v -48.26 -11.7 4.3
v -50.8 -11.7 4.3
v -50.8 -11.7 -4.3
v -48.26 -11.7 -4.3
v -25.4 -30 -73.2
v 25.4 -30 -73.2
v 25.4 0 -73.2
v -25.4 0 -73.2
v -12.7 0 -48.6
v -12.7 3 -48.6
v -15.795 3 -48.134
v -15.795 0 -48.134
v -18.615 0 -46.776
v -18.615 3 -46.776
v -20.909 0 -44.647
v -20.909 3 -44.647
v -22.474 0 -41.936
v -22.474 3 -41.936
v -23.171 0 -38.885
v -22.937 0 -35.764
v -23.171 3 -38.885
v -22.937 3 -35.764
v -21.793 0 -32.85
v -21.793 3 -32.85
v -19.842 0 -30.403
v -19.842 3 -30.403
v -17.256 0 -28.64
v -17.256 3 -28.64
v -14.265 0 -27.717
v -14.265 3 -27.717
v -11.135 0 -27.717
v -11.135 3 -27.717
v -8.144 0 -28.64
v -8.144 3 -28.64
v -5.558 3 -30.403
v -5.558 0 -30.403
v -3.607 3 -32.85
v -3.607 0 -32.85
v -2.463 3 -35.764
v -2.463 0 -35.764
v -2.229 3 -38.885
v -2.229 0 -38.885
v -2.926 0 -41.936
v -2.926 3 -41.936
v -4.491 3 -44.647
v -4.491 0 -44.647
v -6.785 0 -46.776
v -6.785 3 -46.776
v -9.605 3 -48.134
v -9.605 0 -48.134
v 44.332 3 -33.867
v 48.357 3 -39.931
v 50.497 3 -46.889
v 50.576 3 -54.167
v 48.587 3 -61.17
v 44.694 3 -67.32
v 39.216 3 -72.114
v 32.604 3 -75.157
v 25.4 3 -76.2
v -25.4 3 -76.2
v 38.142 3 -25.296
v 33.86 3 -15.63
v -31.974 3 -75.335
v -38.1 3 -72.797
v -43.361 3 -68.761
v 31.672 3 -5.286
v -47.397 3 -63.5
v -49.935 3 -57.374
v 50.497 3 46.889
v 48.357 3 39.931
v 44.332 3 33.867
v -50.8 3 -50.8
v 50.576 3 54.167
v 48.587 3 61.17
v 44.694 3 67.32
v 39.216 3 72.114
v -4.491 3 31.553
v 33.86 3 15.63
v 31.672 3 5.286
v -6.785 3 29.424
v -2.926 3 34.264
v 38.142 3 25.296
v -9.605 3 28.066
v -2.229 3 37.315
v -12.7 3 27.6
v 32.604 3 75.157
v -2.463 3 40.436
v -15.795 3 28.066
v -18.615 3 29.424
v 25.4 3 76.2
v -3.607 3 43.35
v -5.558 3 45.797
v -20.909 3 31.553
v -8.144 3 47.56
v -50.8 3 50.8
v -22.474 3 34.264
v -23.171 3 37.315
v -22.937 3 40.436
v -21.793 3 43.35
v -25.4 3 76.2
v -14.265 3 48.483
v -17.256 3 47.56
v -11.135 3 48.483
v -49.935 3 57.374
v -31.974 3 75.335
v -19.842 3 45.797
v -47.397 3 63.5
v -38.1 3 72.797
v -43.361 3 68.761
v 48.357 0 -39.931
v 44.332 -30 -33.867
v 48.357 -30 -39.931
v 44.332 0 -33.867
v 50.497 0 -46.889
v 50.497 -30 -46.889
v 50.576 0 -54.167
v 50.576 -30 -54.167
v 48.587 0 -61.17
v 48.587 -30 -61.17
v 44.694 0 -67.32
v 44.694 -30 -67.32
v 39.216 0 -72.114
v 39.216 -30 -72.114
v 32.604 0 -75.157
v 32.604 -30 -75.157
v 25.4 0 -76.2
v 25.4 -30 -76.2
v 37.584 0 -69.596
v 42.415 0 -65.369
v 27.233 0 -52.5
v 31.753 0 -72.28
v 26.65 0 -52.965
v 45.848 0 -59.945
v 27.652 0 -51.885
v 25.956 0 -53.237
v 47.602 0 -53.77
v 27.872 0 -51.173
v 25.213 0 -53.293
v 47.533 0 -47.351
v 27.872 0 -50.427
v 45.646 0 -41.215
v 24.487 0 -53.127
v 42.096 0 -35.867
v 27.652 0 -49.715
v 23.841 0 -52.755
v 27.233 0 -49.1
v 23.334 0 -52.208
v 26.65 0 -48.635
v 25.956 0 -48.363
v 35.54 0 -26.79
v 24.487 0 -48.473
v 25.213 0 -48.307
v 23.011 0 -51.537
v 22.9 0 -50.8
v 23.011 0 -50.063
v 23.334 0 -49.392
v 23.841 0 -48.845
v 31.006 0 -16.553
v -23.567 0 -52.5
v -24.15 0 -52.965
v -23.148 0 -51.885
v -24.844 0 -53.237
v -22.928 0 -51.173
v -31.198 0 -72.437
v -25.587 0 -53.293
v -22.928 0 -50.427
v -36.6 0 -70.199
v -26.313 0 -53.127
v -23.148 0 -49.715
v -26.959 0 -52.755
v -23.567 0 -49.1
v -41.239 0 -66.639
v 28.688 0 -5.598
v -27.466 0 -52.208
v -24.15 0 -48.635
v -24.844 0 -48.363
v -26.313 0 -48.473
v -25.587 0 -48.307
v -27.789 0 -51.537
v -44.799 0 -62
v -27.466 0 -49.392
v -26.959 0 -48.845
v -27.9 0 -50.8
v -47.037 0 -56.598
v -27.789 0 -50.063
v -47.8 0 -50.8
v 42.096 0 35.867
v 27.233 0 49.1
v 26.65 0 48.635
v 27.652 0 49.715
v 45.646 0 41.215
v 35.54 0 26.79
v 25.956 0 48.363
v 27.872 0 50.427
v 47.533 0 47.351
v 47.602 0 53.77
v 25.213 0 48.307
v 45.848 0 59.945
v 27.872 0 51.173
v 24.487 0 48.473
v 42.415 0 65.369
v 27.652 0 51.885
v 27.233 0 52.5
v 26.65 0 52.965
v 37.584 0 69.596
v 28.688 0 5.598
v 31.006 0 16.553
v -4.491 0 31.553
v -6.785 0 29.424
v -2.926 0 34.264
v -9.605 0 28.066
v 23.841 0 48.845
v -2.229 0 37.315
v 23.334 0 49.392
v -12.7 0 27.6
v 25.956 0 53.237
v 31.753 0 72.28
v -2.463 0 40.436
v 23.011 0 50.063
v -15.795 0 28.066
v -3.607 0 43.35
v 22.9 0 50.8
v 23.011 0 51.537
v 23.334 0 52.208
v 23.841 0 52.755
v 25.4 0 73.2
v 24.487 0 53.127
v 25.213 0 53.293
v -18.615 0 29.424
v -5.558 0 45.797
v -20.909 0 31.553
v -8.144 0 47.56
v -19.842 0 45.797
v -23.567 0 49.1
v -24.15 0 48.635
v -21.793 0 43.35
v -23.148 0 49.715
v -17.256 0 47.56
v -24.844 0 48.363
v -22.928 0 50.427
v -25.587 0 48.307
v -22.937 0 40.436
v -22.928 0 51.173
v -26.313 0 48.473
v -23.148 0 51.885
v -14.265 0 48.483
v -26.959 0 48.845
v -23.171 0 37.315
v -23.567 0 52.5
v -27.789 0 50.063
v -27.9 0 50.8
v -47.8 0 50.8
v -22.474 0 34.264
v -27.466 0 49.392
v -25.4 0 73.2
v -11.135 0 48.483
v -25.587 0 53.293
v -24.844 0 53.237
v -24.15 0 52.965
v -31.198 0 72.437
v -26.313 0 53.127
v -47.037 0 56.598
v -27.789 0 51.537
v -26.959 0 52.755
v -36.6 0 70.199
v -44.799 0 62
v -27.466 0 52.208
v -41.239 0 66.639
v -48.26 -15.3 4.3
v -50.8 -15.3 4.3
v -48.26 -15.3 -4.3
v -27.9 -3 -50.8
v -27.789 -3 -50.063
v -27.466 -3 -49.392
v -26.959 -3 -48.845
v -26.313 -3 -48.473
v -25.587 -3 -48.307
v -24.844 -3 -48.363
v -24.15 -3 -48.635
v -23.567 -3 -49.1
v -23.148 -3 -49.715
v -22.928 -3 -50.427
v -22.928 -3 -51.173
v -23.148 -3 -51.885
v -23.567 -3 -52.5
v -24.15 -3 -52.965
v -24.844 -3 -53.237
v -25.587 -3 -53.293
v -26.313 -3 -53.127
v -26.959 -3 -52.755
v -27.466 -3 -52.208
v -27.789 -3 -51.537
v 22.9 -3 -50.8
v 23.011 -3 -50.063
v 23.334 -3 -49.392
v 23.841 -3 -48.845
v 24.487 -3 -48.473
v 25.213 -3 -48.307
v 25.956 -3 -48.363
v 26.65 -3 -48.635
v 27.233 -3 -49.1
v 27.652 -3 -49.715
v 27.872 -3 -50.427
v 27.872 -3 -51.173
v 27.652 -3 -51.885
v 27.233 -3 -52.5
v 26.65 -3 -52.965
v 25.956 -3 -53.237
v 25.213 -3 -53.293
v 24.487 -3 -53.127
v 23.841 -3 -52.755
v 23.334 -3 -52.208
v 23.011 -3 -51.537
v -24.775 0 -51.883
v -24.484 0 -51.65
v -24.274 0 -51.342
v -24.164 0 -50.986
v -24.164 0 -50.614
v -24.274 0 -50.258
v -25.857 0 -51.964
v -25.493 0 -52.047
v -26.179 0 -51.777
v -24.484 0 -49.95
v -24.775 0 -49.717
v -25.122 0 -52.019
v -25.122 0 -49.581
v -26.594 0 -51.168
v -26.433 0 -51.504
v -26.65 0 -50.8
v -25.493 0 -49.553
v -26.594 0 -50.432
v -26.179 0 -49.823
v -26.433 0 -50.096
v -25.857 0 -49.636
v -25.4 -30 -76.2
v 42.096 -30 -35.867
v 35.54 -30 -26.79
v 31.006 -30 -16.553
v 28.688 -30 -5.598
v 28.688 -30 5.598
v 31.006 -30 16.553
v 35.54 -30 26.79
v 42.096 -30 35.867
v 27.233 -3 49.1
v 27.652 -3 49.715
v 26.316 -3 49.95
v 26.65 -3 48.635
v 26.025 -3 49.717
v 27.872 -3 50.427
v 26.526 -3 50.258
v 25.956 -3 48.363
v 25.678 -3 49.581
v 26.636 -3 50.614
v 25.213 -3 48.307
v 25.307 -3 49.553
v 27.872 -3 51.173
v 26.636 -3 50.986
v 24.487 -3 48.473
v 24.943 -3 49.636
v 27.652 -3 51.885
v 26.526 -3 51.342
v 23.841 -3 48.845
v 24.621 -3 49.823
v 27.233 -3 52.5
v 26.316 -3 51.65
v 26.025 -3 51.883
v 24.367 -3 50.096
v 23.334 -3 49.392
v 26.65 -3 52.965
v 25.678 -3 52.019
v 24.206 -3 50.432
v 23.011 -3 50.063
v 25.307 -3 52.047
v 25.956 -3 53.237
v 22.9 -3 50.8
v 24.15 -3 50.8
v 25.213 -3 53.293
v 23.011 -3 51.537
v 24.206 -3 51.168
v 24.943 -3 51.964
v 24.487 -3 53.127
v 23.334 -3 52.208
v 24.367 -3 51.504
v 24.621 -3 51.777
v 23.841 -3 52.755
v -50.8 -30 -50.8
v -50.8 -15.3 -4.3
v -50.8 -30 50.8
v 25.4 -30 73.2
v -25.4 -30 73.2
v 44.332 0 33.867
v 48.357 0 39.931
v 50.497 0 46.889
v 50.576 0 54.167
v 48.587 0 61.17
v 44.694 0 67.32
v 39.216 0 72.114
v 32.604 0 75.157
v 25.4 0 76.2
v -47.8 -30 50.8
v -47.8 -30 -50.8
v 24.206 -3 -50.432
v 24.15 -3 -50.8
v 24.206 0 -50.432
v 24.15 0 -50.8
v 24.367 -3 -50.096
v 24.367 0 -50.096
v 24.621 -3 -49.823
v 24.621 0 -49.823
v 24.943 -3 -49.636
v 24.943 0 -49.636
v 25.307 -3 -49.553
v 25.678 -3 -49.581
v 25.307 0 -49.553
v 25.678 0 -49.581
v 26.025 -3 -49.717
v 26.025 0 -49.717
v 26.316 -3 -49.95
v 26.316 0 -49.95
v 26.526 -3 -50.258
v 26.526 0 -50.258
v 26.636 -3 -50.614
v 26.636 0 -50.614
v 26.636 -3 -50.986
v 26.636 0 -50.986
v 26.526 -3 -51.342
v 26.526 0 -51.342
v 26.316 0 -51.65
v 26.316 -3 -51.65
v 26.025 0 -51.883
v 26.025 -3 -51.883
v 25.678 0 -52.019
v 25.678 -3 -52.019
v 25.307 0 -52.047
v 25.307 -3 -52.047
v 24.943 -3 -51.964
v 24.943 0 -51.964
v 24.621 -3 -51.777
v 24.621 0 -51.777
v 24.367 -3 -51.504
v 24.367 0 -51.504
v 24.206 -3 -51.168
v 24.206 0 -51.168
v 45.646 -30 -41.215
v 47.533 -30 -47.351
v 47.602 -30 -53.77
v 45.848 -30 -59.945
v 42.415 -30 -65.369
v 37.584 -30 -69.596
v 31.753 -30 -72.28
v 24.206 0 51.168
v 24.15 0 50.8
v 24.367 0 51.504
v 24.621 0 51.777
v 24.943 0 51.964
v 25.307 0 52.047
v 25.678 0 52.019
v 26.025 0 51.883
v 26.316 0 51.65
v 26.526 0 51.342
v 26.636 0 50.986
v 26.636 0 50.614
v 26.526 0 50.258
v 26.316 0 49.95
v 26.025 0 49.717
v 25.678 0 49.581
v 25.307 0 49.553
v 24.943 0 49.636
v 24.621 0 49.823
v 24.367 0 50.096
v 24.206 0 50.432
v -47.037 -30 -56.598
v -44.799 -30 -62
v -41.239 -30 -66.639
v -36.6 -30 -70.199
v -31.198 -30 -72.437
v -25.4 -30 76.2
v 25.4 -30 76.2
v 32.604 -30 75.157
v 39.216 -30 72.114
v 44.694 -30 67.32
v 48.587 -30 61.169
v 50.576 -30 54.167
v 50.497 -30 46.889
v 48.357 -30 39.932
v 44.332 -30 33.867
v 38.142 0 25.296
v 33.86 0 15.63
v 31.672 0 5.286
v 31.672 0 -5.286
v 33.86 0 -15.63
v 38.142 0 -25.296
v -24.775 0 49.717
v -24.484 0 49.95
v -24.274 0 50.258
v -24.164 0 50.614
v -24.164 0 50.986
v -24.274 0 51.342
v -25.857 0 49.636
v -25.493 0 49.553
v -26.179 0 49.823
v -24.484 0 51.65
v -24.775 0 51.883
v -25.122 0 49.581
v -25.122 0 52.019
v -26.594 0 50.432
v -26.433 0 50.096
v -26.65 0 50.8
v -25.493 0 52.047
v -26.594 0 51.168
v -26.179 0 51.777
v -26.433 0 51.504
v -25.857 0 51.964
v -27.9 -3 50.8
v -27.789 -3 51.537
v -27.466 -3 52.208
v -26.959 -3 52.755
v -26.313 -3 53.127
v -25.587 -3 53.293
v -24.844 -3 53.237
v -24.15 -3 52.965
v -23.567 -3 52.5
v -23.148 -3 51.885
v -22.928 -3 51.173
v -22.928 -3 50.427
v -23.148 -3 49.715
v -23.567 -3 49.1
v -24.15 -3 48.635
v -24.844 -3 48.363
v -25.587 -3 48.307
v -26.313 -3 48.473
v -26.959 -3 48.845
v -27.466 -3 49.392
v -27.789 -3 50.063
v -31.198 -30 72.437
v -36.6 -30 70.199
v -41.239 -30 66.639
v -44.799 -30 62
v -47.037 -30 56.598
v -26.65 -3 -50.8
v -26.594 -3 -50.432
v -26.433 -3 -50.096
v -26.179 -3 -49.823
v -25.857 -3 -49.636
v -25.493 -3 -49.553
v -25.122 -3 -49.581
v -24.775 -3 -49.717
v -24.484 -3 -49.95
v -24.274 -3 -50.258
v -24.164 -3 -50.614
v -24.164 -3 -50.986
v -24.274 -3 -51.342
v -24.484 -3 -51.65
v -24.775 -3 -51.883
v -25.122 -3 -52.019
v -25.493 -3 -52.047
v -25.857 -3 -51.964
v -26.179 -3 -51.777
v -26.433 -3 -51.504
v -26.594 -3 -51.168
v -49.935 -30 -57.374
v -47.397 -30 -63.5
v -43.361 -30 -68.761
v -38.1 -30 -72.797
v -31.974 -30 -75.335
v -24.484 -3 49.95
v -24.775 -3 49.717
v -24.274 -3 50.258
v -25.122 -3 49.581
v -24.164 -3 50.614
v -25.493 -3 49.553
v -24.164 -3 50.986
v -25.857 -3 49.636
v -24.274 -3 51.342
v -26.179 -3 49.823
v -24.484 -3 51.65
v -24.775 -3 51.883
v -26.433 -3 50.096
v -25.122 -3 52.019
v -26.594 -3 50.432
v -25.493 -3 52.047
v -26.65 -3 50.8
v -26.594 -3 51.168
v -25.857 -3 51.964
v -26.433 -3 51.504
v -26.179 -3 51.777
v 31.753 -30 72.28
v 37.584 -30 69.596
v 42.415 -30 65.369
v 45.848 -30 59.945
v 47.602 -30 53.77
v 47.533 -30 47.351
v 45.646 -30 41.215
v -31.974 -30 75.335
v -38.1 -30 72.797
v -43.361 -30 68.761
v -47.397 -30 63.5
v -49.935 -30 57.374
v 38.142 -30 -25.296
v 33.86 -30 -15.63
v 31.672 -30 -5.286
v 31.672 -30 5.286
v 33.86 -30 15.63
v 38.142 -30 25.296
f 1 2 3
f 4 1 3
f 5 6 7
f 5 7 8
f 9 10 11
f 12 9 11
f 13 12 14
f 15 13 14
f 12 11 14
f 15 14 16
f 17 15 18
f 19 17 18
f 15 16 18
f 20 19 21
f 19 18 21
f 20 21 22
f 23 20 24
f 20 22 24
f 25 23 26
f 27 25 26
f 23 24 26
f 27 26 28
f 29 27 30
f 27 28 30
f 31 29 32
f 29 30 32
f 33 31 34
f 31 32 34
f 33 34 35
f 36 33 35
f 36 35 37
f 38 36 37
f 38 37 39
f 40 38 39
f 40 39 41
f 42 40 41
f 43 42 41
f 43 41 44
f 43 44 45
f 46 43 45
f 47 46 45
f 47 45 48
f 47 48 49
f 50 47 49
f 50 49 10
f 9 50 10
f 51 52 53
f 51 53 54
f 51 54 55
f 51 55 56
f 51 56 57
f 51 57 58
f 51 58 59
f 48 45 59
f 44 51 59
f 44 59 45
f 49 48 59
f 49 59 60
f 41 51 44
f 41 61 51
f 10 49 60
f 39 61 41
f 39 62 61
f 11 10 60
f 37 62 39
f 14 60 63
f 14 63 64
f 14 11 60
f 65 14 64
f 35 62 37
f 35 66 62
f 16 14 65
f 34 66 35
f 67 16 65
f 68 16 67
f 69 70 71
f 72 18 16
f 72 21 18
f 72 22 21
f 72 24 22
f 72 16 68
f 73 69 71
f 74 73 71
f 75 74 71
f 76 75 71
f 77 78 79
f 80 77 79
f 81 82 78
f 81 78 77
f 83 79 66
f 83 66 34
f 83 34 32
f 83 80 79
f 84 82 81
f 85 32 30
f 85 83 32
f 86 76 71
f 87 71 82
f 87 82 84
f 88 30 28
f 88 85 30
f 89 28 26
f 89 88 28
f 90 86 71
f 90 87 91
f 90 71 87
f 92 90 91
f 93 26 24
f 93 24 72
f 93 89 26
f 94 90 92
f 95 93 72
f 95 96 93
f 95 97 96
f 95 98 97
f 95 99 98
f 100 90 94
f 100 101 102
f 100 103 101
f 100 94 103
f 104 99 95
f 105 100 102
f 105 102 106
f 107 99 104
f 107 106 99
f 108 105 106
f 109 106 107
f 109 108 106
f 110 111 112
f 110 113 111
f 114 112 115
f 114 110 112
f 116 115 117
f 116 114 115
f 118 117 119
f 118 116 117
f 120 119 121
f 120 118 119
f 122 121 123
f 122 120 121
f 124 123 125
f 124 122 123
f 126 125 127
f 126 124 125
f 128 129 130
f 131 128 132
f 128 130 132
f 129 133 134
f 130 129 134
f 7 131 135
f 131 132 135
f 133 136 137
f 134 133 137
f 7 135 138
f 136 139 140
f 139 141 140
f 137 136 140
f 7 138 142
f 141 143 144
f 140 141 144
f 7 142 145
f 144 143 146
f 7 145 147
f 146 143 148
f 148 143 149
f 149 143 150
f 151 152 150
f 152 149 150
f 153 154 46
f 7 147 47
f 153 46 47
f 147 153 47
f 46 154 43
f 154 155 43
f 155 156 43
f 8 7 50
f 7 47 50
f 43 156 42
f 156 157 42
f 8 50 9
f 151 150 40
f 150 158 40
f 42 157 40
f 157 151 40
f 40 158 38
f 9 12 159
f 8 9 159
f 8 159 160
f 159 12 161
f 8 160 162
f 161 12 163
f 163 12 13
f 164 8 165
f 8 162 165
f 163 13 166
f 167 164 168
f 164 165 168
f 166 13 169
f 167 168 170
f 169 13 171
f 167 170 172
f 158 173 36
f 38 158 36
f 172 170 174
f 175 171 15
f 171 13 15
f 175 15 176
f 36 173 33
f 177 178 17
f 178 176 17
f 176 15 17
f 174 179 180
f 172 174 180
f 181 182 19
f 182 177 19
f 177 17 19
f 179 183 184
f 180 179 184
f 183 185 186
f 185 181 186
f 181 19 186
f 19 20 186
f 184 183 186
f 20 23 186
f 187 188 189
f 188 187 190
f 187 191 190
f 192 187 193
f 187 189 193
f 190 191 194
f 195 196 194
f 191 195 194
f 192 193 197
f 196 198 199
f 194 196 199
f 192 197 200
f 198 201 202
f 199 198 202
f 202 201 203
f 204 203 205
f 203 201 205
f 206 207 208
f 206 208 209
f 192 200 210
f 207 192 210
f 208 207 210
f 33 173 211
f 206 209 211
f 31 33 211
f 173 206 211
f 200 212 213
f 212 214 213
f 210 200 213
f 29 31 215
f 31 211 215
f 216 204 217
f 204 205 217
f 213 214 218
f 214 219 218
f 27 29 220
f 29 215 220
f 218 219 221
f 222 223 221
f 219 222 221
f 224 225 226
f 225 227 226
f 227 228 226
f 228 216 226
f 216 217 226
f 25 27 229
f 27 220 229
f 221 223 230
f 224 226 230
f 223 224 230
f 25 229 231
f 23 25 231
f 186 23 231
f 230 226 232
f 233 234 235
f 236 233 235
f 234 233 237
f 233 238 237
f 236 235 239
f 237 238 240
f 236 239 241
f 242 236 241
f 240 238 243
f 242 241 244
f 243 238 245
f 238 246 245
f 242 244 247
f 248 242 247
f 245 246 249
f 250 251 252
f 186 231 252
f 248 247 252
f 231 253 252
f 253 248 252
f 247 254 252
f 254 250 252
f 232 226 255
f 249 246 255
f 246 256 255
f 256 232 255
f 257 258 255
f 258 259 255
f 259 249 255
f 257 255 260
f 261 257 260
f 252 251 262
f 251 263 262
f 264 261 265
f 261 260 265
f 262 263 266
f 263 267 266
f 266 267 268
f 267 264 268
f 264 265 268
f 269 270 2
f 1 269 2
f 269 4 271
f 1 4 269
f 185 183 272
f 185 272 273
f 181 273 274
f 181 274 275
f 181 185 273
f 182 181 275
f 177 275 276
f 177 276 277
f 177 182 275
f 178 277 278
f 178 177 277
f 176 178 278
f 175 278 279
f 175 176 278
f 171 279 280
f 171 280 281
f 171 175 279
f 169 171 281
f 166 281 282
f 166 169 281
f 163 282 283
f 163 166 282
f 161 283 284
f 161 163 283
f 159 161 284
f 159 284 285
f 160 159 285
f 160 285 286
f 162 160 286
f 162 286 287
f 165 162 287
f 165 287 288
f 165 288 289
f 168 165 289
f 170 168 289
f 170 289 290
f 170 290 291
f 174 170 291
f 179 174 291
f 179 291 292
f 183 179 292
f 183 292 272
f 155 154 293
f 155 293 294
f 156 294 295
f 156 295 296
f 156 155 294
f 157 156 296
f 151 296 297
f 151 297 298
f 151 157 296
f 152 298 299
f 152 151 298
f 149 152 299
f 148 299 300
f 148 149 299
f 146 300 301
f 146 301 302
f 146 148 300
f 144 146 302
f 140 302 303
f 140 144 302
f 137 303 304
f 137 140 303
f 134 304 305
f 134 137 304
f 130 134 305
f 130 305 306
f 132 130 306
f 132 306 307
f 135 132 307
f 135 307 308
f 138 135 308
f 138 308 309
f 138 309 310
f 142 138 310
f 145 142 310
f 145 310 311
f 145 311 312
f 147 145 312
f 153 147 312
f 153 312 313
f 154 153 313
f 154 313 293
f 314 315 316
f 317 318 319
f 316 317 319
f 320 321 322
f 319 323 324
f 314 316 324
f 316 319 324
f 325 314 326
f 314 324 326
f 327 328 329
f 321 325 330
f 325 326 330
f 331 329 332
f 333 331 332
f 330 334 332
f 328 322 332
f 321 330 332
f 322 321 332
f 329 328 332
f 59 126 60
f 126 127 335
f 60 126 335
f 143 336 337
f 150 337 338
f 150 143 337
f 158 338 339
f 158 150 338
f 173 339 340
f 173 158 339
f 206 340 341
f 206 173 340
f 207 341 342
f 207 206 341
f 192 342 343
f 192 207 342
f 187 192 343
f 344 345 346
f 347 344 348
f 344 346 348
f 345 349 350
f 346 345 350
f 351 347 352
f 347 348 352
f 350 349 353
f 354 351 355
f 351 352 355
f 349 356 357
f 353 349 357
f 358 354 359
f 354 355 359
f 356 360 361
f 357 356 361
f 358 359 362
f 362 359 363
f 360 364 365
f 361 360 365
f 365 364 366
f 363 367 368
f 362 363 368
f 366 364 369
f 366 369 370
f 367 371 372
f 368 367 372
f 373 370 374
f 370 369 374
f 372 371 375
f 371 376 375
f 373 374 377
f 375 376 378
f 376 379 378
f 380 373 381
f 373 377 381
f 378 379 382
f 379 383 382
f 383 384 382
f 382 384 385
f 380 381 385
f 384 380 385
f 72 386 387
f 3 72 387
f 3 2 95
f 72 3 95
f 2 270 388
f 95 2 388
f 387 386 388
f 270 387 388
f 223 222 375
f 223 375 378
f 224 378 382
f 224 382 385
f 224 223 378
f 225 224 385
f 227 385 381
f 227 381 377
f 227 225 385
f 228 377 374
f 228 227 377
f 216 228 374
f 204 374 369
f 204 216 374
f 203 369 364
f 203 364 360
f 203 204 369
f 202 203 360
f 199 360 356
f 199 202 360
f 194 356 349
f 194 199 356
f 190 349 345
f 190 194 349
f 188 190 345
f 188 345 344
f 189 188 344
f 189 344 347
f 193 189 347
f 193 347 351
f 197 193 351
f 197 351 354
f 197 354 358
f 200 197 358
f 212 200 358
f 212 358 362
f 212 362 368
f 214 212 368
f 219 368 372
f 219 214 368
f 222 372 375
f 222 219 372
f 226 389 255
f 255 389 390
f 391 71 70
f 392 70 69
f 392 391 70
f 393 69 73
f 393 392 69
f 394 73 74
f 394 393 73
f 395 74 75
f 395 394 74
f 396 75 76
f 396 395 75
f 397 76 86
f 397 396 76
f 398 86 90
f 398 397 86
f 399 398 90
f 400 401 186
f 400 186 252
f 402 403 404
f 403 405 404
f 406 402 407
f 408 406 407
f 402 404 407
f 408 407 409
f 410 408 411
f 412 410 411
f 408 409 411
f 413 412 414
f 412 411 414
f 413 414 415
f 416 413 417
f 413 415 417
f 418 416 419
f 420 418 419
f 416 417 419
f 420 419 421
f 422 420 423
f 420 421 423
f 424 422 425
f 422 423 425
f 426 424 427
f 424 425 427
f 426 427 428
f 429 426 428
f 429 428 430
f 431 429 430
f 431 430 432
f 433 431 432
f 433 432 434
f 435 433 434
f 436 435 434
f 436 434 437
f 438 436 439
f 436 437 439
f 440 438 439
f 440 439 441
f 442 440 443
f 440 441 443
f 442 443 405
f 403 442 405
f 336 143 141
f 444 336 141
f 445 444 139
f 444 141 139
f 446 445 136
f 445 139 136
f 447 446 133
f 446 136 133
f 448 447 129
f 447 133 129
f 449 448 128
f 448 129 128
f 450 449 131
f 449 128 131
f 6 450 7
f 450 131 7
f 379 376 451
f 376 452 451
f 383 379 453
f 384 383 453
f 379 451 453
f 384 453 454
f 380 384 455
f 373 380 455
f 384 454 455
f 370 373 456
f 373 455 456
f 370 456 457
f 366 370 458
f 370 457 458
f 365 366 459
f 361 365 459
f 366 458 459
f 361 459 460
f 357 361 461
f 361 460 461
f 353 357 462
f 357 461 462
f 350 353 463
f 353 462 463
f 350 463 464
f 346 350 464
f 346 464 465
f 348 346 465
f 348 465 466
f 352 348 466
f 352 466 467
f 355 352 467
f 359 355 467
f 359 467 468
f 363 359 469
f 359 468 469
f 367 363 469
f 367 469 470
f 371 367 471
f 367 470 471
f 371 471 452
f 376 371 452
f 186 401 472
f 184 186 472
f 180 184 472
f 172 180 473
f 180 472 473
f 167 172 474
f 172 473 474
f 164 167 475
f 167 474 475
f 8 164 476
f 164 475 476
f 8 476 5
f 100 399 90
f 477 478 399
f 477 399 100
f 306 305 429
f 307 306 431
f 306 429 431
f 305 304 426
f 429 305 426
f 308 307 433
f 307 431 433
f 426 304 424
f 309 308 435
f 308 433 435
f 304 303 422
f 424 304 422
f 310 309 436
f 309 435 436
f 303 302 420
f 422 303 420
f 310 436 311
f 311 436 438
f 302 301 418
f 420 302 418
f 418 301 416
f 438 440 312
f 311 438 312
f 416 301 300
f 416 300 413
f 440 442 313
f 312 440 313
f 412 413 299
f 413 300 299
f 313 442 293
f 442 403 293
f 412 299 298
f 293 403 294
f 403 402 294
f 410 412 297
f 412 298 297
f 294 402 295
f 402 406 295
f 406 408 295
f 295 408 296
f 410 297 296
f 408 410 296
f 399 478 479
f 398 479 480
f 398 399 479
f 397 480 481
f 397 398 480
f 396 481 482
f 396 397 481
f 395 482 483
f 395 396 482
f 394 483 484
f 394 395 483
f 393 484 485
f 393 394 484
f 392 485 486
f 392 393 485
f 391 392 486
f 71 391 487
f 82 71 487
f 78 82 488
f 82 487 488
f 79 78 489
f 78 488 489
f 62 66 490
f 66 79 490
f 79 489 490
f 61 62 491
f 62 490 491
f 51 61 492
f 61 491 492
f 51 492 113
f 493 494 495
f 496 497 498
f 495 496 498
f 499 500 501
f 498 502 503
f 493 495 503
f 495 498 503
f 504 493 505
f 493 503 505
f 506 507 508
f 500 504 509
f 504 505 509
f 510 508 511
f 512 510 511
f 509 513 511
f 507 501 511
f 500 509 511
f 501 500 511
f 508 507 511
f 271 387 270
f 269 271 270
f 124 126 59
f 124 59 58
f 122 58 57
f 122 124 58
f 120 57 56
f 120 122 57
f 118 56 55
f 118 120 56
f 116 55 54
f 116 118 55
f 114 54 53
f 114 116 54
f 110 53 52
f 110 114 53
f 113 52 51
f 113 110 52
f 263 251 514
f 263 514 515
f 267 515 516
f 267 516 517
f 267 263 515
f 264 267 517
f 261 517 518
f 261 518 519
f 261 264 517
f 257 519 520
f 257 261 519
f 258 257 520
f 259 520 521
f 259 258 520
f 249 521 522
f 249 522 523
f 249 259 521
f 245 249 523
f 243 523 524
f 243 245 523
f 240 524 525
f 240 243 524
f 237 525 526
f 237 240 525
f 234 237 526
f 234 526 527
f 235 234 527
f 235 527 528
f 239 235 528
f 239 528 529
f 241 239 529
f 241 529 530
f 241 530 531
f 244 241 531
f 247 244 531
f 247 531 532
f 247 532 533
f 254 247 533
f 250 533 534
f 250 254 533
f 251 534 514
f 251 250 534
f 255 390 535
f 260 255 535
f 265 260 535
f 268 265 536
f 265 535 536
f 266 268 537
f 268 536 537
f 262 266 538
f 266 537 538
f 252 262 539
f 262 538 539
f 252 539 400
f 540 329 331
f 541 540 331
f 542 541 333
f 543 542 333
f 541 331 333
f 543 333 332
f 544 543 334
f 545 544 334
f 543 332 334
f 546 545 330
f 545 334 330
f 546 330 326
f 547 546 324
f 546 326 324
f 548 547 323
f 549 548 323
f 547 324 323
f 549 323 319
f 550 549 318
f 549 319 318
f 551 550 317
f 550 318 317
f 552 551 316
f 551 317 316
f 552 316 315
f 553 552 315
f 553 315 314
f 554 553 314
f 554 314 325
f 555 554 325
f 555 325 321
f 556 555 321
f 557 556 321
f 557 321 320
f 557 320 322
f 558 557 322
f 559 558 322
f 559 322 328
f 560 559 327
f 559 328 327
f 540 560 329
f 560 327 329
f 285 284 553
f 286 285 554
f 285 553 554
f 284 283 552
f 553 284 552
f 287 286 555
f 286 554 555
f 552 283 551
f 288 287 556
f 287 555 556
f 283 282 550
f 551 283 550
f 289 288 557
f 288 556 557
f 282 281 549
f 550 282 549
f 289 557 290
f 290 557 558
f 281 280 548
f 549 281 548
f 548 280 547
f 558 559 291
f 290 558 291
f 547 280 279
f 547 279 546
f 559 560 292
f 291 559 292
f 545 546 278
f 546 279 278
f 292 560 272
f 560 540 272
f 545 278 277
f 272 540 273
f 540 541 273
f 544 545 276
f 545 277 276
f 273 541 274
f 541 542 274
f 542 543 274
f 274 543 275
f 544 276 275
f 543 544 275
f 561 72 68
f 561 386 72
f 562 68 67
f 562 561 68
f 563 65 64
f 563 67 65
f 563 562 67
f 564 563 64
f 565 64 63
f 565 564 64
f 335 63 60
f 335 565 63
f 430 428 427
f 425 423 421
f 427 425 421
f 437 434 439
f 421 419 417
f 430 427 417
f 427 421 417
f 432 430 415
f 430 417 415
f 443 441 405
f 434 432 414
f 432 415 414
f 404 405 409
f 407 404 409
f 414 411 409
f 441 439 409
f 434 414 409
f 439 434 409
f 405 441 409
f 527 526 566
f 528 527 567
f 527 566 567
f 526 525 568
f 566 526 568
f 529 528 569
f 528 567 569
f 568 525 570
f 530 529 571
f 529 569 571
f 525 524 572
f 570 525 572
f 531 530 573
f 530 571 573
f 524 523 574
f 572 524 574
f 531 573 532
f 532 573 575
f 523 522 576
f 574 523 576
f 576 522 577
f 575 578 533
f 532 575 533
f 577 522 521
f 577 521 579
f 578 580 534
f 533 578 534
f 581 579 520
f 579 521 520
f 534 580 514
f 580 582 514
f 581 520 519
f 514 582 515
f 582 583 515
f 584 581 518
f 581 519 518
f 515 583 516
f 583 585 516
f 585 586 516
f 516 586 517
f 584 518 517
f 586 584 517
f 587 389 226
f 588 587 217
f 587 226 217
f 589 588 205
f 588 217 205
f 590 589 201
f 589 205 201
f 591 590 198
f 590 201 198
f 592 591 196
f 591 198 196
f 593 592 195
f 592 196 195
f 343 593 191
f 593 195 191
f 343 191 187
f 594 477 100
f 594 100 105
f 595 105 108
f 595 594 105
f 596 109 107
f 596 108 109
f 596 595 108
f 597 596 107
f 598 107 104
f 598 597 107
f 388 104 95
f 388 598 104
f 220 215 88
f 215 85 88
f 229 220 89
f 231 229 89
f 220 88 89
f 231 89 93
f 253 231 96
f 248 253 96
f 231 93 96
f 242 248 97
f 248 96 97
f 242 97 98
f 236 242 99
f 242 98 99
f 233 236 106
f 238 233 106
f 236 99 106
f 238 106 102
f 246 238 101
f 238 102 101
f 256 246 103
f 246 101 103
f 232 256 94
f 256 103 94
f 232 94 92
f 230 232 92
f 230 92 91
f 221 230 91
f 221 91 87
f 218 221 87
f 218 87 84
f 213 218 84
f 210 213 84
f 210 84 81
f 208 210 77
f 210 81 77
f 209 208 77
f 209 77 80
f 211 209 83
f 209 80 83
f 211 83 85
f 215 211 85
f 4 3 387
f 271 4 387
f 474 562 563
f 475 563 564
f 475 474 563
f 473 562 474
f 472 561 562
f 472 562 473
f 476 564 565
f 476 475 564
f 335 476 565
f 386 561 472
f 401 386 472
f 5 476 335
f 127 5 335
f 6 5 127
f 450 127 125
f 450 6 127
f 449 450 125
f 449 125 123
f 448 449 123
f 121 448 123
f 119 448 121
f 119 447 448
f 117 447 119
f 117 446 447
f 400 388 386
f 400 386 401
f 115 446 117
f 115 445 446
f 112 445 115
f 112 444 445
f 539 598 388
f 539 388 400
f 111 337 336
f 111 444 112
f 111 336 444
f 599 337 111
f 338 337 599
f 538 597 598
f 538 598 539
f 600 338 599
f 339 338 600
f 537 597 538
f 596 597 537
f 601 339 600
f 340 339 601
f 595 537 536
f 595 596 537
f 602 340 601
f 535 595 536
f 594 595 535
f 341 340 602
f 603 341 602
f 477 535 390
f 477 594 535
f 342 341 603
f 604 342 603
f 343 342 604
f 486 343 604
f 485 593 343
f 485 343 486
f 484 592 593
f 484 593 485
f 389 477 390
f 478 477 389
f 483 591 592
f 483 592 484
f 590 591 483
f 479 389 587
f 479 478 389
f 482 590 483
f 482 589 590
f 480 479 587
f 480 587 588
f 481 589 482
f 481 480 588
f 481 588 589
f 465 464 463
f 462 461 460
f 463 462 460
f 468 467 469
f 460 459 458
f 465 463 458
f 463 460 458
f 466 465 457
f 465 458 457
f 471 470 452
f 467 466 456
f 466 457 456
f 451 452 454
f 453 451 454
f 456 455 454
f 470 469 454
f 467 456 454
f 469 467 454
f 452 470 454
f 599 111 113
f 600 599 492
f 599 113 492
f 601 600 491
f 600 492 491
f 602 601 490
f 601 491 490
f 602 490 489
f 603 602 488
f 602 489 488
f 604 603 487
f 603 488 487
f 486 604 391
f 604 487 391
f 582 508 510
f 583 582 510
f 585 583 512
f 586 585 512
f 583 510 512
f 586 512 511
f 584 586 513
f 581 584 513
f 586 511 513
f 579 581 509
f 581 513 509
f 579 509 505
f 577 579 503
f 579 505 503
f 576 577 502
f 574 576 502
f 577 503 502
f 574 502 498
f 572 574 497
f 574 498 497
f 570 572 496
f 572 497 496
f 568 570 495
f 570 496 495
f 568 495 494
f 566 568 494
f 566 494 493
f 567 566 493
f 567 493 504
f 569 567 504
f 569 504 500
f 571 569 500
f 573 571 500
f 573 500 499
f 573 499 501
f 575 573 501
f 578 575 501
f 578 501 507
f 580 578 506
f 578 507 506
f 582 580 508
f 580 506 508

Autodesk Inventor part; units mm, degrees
ref_plane "YZ Plane" through (0, 0, 0) normal (1, 0, 0) x (0, 1, 0)
ref_plane "XZ Plane" through (0, 0, 0) normal (0, 1, 0) x (-1, 0, 0)
ref_plane "XY Plane" through (0, 0, 0) normal (0, 0, 1) x (1, 0, 0)
sketch "Sketch1" plane through (0, 0, 0) normal (0, 1, 0) x (-1, 0, 0)
  line L0 (-25.4, 76.2) -> (25.4, 76.2)
  line L1 (50.8, 76.2) -> (-50.8, 76.2)
  line L2 (-50.8, 50.8) -> (-50.8, -50.8)
  line L3 (50.8, 76.2) -> (-50.8, 76.2)
  line L4 (-25.4, -76.2) -> (25.4, -76.2)
  line L5 (50.8, -50.8) -> (50.8, 50.8)
  arc A0 (50.8, 50.8) -> (25.4, 76.2) centre (25.4, 50.8) ccw
  arc A1 (25.4, -76.2) -> (50.8, -50.8) centre (25.4, -50.8) ccw
  arc A2 (-50.8, -50.8) -> (-25.4, -76.2) centre (-25.4, -50.8) ccw
  arc A3 (-25.4, 76.2) -> (-50.8, 50.8) centre (-25.4, 50.8) ccw
  circle A4 centre (-25.4, 50.8) radius 25.4
  circle A5 centre (-25.4, -50.8) radius 25.4
  circle A6 centre (-50.8, 0) radius 31.3961
  circle A7 centre (-82.1961, 0) radius 50.8
  circle A8 centre (25.4, -50.8) radius 2.5
  circle A9 centre (25.4, -50.8) radius 1.25
  circle A10 centre (25.4, 50.8) radius 2.5
  circle A11 centre (25.4, 50.8) radius 1.25
  circle A12 centre (-25.4, 50.8) radius 2.5
  circle A13 centre (-25.4, 50.8) radius 1.25
  circle A14 centre (-25.4, -50.8) radius 2.5
  circle A15 centre (-25.4, -50.8) radius 1.25
  line L6 (-31.3961, 0) -> (50.8, 0)
  point P0 (-36.7592, 28.0815)
  point P1 (-36.7592, -28.0815)
  point P2 (12.7, 38.1)
  point P3 (12.7, -38.1)
  point P4 (-50.8, -31.3961)
  point P5 (-50.8, 31.3961)
  point P6 (-44.332, -33.8667)
  point P7 (-44.332, 33.8667)
  point P8 (9.7019, 0)
  point P9 (0.3879, -59.1619)
  point P10 (-13.7063, -28.2519)
  dimension "d6" = 101.6
  dimension "d21" = 25.4
  dimension "d68" = 2.5
  dimension "d69" = 2.5
  dimension "d70" = 2.5
  dimension "d71" = 2.5
  dimension "d72" = 5
  dimension "d73" = 5
  dimension "d74" = 5
  dimension "d75" = 5
extrude "Extrusion4" add sketch "Sketch1" along normal blind 3 contours A4 A3 | L0 A0 L5 L6 A6 A4 | A4 A6 A7 | A6 L6 A7 | L5 A1 L4 A5 A6 L6 | A6 A7 L6 | A5 A2 | A7 A6 A5 | A8 | A9 | A10 | A11 | A12 | A13 | A14 | A15
hole "Hole3" at (-12.7, 0, 38.1) at (-12.7, 0, -38.1) direction (0, 1, 0) diameter 21 depth 25.4 tip angle 118
sketch "Sketch5" plane through (0, 0, 0) normal (0, -1, 0) x (1, 0, 0)
  arc A0 (36.7592, 28.0815) -> (36.7592, -28.0815) centre (50.8, 0) ccw projected
  arc A1 (36.7592, 28.0815) -> (36.7592, -28.0815) centre (50.8, 0) ccw
  arc A2 (44.332, 33.8667) -> (25.4, 76.2) centre (25.4, 50.8) ccw projected
  arc A3 (36.7592, 28.0815) -> (25.4, 76.2) centre (25.4, 50.8) ccw
  arc A4 (25.4, -76.2) -> (44.332, -33.8667) centre (25.4, -50.8) ccw projected
  arc A5 (25.4, -76.2) -> (36.7592, -28.0815) centre (25.4, -50.8) ccw
  arc A6 (-25.4, 76.2) -> (-50.8, 50.8) centre (-25.4, 50.8) ccw projected
  line L0 (-50.8, -50.8) -> (-50.8, 50.8) projected
  arc A7 (-25.4, 76.2) -> (-50.8, 50.8) centre (-25.4, 50.8) ccw
  arc A8 (-50.8, -50.8) -> (-25.4, -76.2) centre (-25.4, -50.8) ccw projected
  arc A9 (-50.8, -50.8) -> (-25.4, -76.2) centre (-25.4, -50.8) ccw
  line L1 (-25.4, 76.2) -> (25.4, 76.2) projected
  line L2 (25.4, 76.2) -> (-25.4, 76.2)
  line L3 (25.4, -76.2) -> (-25.4, -76.2) projected
  line L4 (25.4, -76.2) -> (-25.4, -76.2)
  line L5 (-50.8, 50.8) -> (-50.8, -50.8)
  arc A10 (44.332, 33.8667) -> (25.4, 76.2) centre (25.4, 50.8) ccw
  arc A11 (44.332, 33.8667) -> (44.332, -33.8667) centre (82.1961, 0) ccw projected
  arc A12 (44.332, 33.8667) -> (44.332, -33.8667) centre (82.1961, 0) ccw
  arc A13 (25.4, -76.2) -> (44.332, -33.8667) centre (25.4, -50.8) ccw
  arc A14 (-50.8, -50.8) -> (-25.4, -76.2) centre (-25.4, -50.8) ccw
  arc A15 (-25.4, 76.2) -> (-50.8, 50.8) centre (-25.4, 50.8) ccw projected
  arc A16 (-25.4, 76.2) -> (-50.8, 50.8) centre (-25.4, 50.8) ccw
  line L6 (-25.4, 76.2) -> (25.4, 76.2)
  line L7 (-50.8, 50.8) -> (-50.8, -50.8)
  line L8 (-25.4, -76.2) -> (25.4, -76.2)
  point P0 (0, 0)
  point P1 (-12.7, 38.1)
  point P2 (-12.7, -38.1)
extrude "Extrusion5" add sketch "Sketch5" along normal blind 30
shell "Shell1" thickness 3 removed faces 3 at (-23.4013, -30, 0) at (-13.5376, 0, 41.4983) at (-15.9531, 0, -34.6)
sketch "Sketch8" plane through (-50.8, 3, -50.8) normal (-1, 0, 0) x (0, 0, 1)
  line L0 (0, -33) -> (101.6, -33) projected
  line L1 (0, 0) -> (101.6, 0)
  line L2 (101.6, 0) -> (101.6, -33)
  line L3 (101.6, -33) -> (0, -33)
  line L4 (0, -33) -> (0, 0)
  line L5 (50.8, 0) -> (50.8, -33)
  line L6 (0, -16.5) -> (101.6, -16.5)
  line L7 (50.8, -16.5) -> (55.1, -16.5)
  line L8 (55.1, -16.5) -> (55.1, -14.7)
  line L9 (50.8, -16.5) -> (46.5, -16.5)
  line L10 (46.5, -16.5) -> (46.5, -18.3)
  line L11 (55.1, -14.7) -> (46.5, -14.7)
  line L12 (46.5, -14.7) -> (46.5, -18.3)
  line L13 (46.5, -18.3) -> (55.1, -18.3)
  line L14 (55.1, -18.3) -> (55.1, -14.7)
  point P0 (50.8, -3)
  dimension "d82" = 4.3
  dimension "d83" = 4.3
  dimension "d84" = 1.8
  dimension "d85" = 1.8
extrude "Extrusion8" cut sketch "Sketch8" against normal blind 2.54 contours L13 L10 L6 L5 | L5 L6 L14 L13 | L12 L11 L5 L6 | L5 L11 L8 L6
extrude "Extrusion9" add sketch "Sketch1" against normal blind 3 contours A8 | A10 | A12 | A14
equation "\"d69\" = d68"
equation "\"d70\" = d68"
equation "\"d71\" = d68"
equation "\"d73\" = d72"
equation "\"d74\" = d73"
equation "\"d75\" = d72"
equation "\"d83\" = d82"
equation "\"d85\" = d84"
properties part number "ControllerTop"
